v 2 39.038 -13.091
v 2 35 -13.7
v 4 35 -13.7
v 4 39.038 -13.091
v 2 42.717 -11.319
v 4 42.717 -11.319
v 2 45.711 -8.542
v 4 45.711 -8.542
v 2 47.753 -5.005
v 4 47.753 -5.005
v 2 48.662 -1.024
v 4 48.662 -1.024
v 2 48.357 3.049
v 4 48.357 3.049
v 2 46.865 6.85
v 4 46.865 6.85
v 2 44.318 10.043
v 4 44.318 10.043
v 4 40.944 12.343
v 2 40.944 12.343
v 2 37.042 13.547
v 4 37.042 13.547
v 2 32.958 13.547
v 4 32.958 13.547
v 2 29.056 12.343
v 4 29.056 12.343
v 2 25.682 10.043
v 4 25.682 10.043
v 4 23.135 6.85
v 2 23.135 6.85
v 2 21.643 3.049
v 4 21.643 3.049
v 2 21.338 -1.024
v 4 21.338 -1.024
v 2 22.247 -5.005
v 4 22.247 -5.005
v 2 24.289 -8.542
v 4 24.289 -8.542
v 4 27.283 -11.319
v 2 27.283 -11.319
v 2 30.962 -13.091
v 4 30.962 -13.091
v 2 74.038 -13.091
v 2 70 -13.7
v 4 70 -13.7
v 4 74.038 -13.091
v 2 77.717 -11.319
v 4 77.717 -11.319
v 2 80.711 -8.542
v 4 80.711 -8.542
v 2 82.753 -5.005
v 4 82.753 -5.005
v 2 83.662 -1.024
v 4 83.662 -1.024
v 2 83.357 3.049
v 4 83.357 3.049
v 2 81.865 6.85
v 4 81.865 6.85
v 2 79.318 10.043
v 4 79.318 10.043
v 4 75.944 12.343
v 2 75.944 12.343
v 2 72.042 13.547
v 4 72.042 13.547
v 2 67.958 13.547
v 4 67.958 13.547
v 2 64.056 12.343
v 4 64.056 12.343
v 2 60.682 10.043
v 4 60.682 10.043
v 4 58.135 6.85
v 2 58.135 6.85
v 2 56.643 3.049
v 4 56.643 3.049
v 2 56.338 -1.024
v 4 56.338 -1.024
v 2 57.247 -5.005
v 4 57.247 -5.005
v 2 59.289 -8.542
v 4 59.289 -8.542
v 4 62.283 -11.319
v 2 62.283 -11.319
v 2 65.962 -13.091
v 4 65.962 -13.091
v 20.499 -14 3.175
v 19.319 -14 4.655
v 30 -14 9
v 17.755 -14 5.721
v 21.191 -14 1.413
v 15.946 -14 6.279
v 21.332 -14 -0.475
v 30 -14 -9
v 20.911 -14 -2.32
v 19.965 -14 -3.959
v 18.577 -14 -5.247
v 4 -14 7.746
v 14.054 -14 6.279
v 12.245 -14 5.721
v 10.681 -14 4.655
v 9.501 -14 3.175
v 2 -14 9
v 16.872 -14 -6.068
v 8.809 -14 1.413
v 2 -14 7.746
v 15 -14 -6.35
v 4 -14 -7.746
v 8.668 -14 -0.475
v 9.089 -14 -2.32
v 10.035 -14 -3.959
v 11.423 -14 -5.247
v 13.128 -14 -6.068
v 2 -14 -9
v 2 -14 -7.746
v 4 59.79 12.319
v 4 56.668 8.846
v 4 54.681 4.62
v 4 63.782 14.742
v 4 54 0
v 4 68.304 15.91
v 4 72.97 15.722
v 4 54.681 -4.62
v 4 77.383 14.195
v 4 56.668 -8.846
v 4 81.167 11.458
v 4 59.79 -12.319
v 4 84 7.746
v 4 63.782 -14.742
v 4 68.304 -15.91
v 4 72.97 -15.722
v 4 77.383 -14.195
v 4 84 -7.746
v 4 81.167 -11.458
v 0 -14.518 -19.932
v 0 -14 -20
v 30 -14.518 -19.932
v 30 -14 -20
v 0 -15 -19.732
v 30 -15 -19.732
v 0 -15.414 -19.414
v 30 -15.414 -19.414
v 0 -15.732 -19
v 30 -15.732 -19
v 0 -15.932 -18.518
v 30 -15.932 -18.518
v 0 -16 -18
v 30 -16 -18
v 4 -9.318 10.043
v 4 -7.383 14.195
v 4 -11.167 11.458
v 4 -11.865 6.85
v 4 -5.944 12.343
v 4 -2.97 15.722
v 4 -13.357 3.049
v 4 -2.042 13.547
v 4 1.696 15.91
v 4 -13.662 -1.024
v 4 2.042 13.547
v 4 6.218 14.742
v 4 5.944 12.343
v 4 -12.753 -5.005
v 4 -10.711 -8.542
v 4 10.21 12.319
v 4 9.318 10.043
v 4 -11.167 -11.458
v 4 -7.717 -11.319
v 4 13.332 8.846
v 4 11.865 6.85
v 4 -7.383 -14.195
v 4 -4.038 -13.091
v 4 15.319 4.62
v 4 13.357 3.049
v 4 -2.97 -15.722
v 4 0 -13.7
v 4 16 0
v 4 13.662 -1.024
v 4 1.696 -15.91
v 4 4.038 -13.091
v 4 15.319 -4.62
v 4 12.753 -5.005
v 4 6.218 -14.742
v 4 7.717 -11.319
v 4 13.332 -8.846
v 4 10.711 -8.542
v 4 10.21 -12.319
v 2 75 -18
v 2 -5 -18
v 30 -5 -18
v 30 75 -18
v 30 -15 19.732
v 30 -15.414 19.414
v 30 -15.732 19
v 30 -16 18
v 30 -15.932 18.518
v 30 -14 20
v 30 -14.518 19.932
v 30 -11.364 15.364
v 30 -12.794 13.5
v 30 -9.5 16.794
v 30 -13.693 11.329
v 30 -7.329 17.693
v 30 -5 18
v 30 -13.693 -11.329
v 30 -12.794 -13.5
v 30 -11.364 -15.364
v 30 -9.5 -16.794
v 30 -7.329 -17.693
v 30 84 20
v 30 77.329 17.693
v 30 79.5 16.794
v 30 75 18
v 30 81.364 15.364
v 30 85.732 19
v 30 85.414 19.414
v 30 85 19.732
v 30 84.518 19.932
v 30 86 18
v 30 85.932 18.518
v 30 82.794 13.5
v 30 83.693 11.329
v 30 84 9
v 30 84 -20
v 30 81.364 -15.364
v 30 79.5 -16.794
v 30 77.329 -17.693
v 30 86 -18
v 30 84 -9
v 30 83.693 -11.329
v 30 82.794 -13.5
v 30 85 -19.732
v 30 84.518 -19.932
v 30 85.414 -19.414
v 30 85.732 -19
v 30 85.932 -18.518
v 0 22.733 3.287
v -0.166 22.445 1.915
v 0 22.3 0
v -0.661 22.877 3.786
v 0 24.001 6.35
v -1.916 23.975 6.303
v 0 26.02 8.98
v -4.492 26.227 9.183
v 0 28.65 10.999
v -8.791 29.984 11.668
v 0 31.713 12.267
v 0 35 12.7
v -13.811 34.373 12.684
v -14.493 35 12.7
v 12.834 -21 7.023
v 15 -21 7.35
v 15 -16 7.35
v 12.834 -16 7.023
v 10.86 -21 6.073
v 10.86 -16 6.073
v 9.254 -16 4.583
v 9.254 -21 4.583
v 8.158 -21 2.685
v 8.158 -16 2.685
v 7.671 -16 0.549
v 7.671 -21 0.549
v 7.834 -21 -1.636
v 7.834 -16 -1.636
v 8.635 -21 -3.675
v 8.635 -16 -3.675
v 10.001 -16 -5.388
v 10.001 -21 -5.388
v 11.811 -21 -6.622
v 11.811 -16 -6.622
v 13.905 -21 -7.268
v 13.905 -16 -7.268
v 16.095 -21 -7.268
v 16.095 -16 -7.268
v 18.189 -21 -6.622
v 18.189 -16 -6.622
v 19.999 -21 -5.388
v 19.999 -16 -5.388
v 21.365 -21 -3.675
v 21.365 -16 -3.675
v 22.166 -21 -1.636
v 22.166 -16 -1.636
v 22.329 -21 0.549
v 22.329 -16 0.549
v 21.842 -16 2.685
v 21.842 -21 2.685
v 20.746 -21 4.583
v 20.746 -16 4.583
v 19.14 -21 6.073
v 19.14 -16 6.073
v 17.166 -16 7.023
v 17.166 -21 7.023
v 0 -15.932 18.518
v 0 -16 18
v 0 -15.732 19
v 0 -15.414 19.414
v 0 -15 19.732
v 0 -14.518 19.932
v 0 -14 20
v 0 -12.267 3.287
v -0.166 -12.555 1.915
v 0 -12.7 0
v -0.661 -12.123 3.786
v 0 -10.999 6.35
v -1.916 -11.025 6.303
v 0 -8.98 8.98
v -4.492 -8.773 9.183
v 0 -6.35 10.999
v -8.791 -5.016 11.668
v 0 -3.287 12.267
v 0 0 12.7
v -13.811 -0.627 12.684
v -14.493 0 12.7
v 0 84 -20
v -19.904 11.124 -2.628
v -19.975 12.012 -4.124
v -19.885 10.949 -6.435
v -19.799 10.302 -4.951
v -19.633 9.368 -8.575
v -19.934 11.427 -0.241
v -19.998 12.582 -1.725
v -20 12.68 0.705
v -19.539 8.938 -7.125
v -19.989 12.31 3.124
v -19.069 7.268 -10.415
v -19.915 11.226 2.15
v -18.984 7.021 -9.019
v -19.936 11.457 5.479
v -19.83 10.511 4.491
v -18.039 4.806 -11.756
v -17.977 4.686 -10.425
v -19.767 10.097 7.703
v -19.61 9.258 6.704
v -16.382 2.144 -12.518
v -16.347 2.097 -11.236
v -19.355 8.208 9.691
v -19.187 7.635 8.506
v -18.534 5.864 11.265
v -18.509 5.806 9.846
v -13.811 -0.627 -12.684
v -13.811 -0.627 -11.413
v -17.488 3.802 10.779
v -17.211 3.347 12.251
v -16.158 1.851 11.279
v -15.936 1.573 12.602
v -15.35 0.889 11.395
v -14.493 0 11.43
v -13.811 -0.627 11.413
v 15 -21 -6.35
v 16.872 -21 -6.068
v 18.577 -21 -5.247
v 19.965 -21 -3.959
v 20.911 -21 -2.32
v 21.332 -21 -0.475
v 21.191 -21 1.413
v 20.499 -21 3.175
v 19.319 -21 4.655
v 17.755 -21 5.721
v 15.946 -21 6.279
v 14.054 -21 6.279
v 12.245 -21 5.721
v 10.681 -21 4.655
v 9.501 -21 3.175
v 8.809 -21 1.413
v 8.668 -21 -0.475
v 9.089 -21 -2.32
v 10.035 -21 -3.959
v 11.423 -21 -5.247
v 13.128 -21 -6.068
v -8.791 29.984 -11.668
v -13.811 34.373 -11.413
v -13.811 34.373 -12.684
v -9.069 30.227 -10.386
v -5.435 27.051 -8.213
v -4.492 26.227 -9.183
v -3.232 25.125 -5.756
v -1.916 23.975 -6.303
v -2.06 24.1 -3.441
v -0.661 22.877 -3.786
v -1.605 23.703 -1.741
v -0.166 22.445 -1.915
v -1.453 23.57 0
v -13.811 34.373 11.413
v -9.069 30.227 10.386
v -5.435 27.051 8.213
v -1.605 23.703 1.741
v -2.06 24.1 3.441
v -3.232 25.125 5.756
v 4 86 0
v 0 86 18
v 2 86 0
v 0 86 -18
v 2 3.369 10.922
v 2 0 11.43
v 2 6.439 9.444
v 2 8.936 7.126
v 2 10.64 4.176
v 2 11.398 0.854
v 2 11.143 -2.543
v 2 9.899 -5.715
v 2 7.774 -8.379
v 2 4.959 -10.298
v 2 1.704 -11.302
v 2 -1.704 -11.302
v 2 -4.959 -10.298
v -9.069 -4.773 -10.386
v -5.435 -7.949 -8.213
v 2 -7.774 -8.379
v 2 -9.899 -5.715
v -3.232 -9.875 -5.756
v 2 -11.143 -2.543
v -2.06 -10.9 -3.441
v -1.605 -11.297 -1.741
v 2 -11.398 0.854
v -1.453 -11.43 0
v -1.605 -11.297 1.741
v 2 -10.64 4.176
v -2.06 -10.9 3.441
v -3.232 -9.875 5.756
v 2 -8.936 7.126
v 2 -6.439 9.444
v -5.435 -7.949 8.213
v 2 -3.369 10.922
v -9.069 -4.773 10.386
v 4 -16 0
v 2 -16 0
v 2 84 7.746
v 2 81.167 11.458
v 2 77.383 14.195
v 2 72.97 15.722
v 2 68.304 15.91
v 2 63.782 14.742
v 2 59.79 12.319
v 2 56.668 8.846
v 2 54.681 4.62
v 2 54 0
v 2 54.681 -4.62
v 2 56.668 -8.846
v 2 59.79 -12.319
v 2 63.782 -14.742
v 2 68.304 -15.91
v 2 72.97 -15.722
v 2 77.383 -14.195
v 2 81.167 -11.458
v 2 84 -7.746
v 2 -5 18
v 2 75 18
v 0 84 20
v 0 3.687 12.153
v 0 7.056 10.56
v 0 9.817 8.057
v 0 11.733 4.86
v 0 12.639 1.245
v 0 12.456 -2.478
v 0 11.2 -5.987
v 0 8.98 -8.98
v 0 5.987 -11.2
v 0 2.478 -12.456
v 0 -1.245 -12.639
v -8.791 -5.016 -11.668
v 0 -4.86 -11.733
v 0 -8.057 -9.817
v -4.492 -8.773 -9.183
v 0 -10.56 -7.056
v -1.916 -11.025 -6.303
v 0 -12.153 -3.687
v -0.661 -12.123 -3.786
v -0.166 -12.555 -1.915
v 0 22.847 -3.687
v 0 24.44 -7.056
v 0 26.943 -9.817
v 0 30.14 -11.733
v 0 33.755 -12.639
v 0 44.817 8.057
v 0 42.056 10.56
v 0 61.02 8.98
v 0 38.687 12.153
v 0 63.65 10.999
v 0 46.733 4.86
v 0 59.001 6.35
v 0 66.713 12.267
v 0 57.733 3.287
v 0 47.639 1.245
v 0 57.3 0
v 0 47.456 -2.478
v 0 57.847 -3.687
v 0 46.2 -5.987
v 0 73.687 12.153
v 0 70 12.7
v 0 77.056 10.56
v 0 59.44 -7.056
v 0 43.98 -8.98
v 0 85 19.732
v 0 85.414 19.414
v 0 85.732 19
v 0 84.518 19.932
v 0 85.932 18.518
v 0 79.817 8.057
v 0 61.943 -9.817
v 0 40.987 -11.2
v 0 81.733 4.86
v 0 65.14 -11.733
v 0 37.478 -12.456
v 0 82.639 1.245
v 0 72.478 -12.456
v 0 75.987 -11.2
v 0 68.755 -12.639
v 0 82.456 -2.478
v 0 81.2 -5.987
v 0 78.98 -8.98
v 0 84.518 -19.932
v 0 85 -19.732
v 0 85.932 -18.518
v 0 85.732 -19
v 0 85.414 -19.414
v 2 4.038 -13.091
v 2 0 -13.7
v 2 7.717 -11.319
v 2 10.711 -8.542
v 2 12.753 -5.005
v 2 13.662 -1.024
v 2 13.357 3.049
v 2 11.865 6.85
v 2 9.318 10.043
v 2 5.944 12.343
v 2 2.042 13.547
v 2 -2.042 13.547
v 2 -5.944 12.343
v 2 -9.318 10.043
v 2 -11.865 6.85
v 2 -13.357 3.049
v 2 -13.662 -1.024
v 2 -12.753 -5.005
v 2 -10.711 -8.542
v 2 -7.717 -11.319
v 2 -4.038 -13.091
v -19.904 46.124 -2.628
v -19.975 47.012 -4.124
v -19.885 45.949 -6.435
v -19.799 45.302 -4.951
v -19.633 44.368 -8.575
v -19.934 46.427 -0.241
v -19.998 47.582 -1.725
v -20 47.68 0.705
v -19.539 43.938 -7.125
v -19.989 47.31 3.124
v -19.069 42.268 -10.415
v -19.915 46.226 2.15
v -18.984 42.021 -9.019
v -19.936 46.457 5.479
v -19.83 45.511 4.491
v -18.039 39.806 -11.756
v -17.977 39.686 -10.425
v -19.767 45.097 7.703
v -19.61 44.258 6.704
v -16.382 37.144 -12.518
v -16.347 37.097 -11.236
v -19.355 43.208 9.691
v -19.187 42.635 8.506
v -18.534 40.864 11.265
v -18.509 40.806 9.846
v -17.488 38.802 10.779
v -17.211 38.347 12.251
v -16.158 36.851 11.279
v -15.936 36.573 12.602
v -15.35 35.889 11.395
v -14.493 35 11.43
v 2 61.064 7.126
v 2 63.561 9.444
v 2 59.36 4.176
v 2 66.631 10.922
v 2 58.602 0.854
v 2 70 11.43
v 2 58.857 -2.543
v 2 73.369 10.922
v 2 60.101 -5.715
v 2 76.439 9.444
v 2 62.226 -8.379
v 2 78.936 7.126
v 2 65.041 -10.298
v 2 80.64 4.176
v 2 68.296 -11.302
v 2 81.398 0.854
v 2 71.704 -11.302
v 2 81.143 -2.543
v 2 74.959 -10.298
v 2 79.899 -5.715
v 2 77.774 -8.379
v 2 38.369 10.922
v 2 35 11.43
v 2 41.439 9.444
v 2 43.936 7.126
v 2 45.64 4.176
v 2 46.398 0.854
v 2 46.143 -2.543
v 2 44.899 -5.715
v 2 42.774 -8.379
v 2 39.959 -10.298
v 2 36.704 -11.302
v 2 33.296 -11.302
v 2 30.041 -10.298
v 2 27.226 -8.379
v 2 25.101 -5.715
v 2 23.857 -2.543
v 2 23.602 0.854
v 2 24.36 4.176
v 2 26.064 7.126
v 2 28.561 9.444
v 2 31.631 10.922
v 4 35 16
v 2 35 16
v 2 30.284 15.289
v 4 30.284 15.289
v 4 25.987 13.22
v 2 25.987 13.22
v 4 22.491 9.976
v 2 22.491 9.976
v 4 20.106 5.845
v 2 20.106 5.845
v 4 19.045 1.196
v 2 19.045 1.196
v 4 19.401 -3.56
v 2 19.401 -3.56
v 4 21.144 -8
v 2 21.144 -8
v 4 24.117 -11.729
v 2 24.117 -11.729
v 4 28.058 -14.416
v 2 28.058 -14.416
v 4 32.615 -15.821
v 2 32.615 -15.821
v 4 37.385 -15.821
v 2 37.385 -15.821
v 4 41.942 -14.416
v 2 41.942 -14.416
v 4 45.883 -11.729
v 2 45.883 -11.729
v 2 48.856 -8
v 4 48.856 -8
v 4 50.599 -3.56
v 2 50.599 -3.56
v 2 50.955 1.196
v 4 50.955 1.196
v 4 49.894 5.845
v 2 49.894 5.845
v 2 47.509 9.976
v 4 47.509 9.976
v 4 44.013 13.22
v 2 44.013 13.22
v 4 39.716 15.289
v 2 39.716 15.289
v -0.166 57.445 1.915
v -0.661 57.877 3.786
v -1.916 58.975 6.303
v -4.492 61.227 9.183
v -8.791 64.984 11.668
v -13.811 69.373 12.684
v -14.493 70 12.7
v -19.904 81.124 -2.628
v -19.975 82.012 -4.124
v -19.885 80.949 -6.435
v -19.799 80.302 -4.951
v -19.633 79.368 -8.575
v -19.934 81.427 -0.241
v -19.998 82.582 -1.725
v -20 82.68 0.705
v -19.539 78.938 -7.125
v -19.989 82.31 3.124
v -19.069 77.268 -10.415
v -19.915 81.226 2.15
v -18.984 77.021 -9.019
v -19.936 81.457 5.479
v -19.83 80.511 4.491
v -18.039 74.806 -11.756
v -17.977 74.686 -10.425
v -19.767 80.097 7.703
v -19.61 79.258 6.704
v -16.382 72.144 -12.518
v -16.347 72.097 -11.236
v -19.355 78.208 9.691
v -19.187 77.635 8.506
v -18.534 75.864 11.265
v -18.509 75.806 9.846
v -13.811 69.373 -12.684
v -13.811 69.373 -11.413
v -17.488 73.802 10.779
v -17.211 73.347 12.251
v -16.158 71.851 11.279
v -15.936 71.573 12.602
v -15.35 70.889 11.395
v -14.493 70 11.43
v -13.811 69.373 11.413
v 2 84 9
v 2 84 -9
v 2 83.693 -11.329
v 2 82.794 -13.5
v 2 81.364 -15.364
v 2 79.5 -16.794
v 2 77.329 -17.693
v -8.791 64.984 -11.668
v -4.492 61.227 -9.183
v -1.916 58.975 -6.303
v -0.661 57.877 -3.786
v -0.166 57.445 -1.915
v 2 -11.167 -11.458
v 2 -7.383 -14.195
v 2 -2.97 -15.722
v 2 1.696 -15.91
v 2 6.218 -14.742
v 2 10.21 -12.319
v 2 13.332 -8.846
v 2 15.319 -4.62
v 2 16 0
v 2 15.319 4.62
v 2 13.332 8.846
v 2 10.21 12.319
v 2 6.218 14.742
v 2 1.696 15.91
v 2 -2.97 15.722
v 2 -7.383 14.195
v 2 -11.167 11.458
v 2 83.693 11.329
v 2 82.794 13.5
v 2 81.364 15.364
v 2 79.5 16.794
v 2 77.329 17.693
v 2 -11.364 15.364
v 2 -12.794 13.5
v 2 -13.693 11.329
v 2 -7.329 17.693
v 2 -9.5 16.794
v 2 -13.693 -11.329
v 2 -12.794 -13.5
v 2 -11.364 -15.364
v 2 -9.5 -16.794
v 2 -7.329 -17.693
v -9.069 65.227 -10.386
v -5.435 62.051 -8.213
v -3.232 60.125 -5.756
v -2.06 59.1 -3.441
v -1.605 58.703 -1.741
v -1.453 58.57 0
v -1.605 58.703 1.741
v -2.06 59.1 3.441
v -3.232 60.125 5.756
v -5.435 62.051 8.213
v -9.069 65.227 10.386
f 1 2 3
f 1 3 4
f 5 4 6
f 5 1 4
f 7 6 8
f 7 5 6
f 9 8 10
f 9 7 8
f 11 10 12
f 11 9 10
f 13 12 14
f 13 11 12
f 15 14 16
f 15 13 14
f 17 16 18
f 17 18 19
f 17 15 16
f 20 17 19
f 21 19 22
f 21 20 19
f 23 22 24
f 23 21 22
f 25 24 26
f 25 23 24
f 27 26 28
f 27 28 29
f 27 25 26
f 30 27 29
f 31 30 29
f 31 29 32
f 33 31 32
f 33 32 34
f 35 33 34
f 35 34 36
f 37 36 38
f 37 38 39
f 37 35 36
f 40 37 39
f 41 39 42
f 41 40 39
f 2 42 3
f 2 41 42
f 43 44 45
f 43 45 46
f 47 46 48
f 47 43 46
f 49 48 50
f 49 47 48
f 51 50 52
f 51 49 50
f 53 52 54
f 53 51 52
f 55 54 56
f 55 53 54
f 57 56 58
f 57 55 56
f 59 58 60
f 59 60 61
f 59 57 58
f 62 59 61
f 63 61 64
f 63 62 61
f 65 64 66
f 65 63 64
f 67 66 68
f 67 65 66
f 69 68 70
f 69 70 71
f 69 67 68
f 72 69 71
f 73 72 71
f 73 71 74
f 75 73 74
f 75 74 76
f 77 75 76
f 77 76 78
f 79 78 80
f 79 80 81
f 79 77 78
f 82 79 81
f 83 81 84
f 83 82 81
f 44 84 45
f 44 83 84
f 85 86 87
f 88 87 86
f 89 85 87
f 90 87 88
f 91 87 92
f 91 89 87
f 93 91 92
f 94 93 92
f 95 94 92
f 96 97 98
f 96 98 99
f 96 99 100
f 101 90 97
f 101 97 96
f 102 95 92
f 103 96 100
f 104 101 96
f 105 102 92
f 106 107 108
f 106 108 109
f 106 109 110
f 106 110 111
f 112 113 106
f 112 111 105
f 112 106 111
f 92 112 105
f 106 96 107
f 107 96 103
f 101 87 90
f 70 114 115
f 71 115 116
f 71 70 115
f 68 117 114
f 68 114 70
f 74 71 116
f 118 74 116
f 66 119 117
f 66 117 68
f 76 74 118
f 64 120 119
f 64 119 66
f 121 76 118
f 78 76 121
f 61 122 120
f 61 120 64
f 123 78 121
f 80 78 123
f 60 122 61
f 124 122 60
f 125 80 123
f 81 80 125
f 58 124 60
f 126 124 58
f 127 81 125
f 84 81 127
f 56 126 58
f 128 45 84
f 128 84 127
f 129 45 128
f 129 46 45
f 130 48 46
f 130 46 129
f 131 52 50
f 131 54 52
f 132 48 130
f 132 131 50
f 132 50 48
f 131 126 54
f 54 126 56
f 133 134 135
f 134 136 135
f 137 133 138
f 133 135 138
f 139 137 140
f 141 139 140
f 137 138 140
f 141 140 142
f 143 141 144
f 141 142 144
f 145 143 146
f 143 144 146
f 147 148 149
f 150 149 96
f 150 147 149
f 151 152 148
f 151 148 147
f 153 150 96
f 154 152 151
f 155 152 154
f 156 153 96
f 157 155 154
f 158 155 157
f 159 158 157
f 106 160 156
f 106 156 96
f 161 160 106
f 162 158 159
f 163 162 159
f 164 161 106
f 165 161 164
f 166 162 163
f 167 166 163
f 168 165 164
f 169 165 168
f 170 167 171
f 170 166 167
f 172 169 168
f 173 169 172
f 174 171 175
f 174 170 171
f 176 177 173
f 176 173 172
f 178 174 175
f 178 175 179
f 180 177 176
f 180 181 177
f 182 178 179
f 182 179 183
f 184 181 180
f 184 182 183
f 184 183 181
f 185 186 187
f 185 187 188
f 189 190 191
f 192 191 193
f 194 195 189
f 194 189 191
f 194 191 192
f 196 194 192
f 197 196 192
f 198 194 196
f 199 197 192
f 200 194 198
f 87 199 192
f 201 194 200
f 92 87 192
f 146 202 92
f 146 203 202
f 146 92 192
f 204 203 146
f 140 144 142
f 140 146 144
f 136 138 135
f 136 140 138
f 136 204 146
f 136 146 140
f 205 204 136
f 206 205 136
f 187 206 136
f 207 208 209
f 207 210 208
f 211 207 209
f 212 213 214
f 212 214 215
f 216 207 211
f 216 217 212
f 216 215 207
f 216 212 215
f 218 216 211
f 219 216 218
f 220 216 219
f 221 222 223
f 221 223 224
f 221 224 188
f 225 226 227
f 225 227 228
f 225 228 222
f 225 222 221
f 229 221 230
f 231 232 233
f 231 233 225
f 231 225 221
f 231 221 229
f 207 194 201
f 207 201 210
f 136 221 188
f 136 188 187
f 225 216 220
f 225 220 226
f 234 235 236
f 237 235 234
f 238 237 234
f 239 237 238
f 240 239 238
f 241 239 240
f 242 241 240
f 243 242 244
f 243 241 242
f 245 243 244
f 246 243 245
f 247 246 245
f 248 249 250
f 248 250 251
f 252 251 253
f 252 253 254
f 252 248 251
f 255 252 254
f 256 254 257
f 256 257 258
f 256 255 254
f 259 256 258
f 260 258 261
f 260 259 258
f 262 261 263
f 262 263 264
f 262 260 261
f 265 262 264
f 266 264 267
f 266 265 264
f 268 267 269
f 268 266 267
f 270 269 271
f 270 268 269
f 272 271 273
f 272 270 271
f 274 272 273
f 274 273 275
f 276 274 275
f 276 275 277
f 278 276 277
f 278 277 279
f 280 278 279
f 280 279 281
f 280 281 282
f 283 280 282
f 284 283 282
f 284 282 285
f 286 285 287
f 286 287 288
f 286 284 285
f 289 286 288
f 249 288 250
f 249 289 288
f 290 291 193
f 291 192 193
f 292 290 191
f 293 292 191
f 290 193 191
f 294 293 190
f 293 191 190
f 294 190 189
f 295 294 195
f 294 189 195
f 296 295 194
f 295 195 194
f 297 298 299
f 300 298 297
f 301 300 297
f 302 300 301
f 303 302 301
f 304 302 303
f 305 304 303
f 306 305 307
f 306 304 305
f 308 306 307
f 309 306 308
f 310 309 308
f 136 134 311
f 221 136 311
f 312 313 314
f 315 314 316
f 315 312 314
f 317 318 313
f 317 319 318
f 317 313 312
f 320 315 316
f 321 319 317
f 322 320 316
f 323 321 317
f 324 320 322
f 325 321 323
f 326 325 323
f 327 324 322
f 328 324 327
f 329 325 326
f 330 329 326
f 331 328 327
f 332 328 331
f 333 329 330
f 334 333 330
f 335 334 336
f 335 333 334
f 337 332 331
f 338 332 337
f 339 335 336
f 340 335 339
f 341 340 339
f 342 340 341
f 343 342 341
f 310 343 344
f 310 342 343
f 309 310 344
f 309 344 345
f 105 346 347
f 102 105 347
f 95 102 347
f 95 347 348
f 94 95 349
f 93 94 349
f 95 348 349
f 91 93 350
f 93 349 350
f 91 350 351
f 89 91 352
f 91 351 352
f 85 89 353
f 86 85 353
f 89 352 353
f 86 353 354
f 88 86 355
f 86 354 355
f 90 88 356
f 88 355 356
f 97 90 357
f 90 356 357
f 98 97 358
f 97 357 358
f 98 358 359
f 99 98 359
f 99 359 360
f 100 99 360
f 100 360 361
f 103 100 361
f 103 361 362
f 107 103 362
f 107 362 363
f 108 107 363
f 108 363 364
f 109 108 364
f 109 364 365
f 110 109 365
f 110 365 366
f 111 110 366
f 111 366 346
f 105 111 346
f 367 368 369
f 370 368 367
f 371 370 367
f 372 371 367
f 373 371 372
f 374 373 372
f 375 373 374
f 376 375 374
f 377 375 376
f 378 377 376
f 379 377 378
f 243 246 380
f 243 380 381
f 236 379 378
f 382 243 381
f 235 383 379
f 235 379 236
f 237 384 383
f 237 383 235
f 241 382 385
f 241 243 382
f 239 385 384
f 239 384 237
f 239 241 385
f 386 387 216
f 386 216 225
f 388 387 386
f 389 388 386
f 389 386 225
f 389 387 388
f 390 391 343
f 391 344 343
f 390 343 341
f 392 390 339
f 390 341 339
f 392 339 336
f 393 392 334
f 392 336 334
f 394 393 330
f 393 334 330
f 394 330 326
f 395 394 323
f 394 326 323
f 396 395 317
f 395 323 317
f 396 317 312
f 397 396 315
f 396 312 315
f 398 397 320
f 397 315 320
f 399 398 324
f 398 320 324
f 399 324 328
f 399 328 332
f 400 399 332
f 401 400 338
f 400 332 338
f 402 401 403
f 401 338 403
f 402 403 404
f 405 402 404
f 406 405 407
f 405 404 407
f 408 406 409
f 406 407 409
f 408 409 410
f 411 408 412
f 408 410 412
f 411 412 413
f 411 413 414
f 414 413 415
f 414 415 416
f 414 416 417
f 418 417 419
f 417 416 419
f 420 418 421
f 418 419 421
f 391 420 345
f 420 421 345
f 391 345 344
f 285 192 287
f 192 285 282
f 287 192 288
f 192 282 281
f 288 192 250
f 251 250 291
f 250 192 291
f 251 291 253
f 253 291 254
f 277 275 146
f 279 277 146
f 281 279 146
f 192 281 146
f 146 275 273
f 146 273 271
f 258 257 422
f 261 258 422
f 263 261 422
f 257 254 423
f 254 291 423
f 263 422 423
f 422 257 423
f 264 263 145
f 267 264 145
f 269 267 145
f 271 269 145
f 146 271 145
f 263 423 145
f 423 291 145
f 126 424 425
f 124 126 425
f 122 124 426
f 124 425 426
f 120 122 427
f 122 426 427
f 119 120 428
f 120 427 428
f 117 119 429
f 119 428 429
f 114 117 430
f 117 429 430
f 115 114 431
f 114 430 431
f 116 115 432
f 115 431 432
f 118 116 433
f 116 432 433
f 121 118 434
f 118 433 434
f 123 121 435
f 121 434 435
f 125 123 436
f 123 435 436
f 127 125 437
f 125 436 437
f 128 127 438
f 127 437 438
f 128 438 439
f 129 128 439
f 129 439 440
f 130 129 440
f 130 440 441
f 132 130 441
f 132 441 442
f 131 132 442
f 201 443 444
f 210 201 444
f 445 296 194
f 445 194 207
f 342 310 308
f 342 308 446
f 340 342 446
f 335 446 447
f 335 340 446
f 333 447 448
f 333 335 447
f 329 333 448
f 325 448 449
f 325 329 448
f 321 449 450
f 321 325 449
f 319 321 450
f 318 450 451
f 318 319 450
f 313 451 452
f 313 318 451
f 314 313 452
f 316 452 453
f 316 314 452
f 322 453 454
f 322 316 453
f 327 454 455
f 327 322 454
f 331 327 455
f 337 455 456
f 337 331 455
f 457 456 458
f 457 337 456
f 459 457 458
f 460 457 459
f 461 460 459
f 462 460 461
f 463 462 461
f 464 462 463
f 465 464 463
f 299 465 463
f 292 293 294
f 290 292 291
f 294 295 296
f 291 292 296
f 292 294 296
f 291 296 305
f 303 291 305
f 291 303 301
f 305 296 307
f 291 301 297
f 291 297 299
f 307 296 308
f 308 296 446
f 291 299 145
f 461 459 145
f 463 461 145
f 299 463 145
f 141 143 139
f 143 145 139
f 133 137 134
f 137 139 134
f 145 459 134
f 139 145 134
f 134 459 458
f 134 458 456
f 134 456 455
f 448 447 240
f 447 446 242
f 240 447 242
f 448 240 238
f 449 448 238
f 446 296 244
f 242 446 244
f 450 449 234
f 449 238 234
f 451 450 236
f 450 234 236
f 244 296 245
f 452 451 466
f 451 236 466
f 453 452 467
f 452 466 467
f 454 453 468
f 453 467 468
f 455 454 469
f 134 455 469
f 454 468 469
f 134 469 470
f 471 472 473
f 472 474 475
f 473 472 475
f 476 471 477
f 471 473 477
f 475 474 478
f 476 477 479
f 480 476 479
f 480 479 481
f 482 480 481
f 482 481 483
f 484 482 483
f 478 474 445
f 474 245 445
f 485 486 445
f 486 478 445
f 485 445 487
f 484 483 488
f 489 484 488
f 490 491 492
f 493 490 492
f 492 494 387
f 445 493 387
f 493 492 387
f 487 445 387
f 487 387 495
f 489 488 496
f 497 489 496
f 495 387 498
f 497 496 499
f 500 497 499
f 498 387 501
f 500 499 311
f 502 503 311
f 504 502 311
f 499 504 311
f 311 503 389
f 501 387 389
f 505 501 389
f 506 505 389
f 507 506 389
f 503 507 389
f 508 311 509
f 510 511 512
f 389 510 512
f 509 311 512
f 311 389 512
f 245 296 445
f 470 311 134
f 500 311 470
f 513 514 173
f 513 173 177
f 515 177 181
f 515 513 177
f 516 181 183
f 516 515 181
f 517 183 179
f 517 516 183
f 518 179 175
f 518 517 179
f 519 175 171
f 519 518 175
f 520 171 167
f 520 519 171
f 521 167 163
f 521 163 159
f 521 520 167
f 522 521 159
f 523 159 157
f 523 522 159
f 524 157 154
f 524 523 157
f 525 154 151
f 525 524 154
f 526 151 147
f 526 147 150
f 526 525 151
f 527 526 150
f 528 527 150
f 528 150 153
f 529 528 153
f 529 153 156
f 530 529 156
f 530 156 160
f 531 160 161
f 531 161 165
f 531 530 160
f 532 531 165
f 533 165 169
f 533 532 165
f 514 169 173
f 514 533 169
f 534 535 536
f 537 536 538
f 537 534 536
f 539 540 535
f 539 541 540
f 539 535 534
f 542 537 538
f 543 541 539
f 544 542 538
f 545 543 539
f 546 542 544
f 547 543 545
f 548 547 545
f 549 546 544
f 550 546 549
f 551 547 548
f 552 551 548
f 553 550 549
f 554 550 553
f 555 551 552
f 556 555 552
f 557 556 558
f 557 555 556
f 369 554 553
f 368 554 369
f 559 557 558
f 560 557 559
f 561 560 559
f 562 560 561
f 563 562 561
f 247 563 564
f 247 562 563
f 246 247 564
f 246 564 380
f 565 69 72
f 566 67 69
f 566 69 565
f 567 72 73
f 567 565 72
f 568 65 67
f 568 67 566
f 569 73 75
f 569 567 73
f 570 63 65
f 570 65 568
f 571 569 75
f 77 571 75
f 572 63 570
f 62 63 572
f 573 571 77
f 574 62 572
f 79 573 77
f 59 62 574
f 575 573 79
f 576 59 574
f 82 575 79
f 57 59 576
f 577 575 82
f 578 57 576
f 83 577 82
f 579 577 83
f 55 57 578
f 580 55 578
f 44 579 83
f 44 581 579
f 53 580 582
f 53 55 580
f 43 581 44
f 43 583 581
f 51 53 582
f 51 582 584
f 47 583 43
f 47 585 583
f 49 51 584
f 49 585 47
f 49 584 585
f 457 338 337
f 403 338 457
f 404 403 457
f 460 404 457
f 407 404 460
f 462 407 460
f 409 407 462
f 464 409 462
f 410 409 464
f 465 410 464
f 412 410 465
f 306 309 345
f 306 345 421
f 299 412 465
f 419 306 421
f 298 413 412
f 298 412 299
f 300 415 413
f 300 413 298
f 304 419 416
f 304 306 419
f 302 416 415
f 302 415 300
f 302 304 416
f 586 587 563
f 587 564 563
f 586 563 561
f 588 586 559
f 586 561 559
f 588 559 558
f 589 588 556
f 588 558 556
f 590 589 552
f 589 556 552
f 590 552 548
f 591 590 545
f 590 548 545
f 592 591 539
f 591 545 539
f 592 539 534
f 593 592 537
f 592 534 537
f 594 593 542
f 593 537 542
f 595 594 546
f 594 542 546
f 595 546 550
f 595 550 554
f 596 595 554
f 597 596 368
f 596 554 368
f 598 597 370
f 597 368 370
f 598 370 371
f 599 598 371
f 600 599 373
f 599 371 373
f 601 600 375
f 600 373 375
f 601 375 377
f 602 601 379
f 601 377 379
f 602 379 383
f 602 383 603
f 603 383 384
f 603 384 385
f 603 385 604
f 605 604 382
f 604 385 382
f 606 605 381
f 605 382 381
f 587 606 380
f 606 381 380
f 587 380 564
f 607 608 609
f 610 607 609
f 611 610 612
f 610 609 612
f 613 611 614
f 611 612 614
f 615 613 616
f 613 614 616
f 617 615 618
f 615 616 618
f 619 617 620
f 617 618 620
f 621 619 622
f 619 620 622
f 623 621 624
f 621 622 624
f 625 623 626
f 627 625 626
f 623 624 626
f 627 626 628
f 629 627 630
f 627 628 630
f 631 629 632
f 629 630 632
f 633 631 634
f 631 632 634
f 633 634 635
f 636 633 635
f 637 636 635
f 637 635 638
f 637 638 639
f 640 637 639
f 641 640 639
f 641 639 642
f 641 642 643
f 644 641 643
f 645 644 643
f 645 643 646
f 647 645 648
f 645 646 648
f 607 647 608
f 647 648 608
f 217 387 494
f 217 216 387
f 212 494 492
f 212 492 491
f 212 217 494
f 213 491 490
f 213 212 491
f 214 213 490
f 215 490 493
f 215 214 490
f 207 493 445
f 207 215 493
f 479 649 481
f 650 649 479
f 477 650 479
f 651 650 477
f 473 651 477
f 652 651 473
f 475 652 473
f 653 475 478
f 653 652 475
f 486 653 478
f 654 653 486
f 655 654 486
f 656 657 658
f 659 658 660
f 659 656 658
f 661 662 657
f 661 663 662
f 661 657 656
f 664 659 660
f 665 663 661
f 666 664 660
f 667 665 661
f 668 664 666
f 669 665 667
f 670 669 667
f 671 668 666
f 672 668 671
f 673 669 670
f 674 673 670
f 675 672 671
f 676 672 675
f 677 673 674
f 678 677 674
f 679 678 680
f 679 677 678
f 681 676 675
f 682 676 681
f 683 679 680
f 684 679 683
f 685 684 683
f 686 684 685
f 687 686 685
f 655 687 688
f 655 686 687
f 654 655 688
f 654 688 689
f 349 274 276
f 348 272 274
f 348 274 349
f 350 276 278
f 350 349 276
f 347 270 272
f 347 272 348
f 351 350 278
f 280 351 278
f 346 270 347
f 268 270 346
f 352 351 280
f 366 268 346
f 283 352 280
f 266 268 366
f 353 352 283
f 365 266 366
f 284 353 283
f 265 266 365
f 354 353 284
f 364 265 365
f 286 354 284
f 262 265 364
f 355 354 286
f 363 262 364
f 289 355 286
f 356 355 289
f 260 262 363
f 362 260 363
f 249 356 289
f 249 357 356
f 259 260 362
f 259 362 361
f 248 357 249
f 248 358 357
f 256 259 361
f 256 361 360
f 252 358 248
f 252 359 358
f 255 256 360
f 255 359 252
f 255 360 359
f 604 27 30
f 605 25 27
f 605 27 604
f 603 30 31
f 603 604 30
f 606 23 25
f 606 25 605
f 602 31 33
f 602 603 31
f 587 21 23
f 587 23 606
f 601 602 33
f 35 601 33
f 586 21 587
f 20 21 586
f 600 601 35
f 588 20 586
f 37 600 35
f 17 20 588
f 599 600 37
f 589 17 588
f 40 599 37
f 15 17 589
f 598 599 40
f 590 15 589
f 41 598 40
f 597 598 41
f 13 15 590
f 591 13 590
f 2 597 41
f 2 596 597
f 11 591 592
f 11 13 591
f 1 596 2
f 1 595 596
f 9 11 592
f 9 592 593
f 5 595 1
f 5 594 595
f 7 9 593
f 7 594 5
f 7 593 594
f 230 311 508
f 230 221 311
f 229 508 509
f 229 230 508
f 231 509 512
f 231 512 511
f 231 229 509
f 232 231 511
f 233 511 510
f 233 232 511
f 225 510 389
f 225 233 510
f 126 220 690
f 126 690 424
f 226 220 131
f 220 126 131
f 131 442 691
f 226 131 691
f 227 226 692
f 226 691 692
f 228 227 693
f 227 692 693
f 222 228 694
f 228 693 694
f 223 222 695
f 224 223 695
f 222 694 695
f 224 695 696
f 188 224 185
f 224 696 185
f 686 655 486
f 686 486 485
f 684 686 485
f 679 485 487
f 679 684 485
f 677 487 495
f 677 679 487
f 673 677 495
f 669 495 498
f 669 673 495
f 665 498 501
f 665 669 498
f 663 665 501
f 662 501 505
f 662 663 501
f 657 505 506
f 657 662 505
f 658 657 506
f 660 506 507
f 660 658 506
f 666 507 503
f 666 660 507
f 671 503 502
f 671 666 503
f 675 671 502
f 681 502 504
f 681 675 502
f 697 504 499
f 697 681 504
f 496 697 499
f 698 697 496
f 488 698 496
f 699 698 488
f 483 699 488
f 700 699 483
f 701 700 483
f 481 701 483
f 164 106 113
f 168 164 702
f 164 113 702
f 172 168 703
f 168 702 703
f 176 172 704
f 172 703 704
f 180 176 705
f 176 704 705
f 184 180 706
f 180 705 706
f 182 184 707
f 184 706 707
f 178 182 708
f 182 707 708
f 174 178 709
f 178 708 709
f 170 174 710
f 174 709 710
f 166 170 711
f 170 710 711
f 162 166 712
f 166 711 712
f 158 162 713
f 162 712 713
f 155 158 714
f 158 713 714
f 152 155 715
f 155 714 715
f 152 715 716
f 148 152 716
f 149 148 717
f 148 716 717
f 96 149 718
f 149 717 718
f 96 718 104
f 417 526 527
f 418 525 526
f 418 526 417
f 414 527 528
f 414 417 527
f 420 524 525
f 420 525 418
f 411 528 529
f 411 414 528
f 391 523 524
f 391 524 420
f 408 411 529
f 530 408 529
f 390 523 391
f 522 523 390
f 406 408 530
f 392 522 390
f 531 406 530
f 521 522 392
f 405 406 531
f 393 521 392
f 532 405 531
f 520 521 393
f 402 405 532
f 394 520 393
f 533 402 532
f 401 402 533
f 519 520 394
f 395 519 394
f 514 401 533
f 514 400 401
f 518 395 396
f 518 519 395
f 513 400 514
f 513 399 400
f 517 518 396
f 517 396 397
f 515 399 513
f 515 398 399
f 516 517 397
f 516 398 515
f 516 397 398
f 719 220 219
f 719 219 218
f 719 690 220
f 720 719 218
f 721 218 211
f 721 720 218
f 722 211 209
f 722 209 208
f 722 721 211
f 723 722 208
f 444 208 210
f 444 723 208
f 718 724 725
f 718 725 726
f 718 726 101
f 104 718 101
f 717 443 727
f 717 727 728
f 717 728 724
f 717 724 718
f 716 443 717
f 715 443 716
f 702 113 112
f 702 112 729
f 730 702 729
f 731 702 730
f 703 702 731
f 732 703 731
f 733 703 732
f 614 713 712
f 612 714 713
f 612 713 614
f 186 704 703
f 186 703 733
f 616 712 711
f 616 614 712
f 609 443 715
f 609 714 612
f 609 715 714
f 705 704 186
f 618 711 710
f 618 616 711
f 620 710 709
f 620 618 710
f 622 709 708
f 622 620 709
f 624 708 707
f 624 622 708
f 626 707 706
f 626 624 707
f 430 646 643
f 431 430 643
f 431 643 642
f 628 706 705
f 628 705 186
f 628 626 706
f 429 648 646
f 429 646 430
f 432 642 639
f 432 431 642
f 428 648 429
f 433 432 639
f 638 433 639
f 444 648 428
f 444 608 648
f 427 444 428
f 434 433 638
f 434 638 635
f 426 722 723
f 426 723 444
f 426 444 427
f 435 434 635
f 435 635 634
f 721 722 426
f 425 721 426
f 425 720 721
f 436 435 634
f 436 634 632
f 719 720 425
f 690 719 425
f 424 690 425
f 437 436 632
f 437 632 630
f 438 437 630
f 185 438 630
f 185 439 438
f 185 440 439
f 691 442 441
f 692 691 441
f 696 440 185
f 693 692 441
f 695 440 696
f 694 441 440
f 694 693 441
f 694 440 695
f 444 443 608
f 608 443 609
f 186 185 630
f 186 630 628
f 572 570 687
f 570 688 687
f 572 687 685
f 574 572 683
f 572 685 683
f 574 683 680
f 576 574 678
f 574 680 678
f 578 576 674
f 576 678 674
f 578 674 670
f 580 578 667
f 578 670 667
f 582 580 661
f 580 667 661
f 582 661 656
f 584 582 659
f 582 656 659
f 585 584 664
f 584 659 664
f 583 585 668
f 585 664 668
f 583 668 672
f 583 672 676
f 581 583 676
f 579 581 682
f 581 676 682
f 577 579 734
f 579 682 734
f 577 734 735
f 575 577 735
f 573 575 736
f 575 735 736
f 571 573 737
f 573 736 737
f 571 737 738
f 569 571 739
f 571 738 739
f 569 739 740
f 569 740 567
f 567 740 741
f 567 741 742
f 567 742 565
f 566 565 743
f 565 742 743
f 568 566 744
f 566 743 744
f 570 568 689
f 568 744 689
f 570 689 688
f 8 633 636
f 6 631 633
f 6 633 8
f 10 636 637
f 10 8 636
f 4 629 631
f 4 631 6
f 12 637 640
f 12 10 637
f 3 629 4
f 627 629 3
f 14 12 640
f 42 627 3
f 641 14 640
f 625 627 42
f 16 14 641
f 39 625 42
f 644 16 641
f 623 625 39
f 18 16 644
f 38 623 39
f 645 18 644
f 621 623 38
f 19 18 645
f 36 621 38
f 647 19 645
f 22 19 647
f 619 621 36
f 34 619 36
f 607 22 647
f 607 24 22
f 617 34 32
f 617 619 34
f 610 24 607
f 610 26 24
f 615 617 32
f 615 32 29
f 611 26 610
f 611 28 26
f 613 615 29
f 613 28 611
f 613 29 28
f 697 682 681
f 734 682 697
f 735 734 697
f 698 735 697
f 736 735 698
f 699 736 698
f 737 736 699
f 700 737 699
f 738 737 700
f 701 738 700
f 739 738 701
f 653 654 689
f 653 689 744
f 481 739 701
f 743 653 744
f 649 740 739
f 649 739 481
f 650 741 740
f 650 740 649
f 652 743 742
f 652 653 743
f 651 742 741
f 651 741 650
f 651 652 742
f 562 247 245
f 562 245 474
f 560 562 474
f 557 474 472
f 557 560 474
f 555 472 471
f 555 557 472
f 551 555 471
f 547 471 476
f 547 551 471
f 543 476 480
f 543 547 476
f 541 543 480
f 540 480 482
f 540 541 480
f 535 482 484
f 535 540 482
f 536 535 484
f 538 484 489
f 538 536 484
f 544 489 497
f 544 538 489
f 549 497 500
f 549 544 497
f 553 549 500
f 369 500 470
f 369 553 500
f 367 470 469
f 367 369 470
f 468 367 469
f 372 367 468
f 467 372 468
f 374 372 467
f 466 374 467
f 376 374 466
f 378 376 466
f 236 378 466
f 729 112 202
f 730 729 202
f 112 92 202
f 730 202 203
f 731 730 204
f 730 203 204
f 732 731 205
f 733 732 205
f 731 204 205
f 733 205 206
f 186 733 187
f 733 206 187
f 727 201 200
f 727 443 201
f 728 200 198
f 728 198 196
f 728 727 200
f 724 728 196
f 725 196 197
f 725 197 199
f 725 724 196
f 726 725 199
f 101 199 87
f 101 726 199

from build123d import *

# Parameters (mm, degrees)
SKETCH1_W                      = 40
SKETCH1_H                      = 102
BOSS_EXTRUDE1_DEPTH            = 30
SHELL1_T                       = -2
CUT_EXTRUDE1_REACH             = 95.252
SKETCH2_R                      = 11.43
BOSS_EXTRUDE2_START            = 20
SKETCH3_R                      = 12.7
SKETCH3_R_2                    = 11.43
BOSS_EXTRUDE2_DEPTH            = 20
CUT_EXTRUDE2_REACH             = 95.252
CUT_EXTRUDE2_DIRECTION_2_REACH = 95.252
LPATTERN1_COUNT                = 3
LPATTERN1_PITCH                = 35
SKETCH5_R                      = 16
SKETCH5_R_2                    = 13.7
BOSS_EXTRUDE3_DEPTH            = 2
FILLET1_R                      = 2
CUT_EXTRUDE3_REACH             = 110.185
SKETCH6_R                      = 6.35
BOSS_EXTRUDE4_START            = 5
SKETCH7_R                      = 7.35
SKETCH7_R_2                    = 6.35
BOSS_EXTRUDE4_DEPTH            = 5
FILLET6_R                      = 9


with BuildPart() as part:
    # Sketch1 → Boss-Extrude1 (new body)
    with BuildSketch(Plane(origin=(0, 0, 0), x_dir=(0, 0, -1), z_dir=(1, 0, 0))):
        with Locations((0, 35)):
            Rectangle(SKETCH1_W, SKETCH1_H)
    extrude(amount=BOSS_EXTRUDE1_DEPTH)

    # Shell1
    shell1_openings = [part.faces().sort_by_distance(p)[0] for p in [
        (30, 35, 0),
    ]]
    offset(amount=SHELL1_T, openings=shell1_openings, kind=Kind.INTERSECTION)

    # Sketch2 → Cut-Extrude1 (cut, up to next)
    with BuildSketch(Plane.ZY, mode=Mode.PRIVATE) as cut_extrude1_sk1:
        Circle(SKETCH2_R)
    cut_extrude1_tool1 = extrude(cut_extrude1_sk1.sketch, amount=-CUT_EXTRUDE1_REACH, mode=Mode.PRIVATE) & part.part
    # Sketch2 → Cut-Extrude1 (cut, up to next)
    with BuildSketch(Plane.ZY, mode=Mode.PRIVATE) as cut_extrude1_sk2:
        with Locations((0, 35)):
            Circle(SKETCH2_R)
    cut_extrude1_tool2 = extrude(cut_extrude1_sk2.sketch, amount=-CUT_EXTRUDE1_REACH, mode=Mode.PRIVATE) & part.part
    # Sketch2 → Cut-Extrude1 (cut, up to next)
    with BuildSketch(Plane.ZY, mode=Mode.PRIVATE) as cut_extrude1_sk3:
        with Locations((0, 70)):
            Circle(SKETCH2_R)
    cut_extrude1_tool3 = extrude(cut_extrude1_sk3.sketch, amount=-CUT_EXTRUDE1_REACH, mode=Mode.PRIVATE) & part.part
    add(cut_extrude1_tool1.solids().sort_by_distance((0, 0, 0))[0], mode=Mode.SUBTRACT)
    add(cut_extrude1_tool2.solids().sort_by_distance((0, 35, 0))[0], mode=Mode.SUBTRACT)
    add(cut_extrude1_tool3.solids().sort_by_distance((0, 70, 0))[0], mode=Mode.SUBTRACT)

    # Sketch3 → Boss-Extrude2 (add)
    # profile 1 of 3: a face of its own
    with BuildSketch(Plane.ZY.offset(BOSS_EXTRUDE2_START)):
        Circle(SKETCH3_R)
        Circle(SKETCH3_R_2, mode=Mode.SUBTRACT)
    # profile 2 of 3: a face of its own
    with BuildSketch(Plane.ZY.offset(BOSS_EXTRUDE2_START)):
        with Locations((0, 35)):
            Circle(SKETCH3_R)
        with Locations((0, 35)):
            Circle(SKETCH3_R_2, mode=Mode.SUBTRACT)
    # profile 3 of 3: a face of its own
    with BuildSketch(Plane.ZY.offset(BOSS_EXTRUDE2_START)):
        with Locations((0, 70)):
            Circle(SKETCH3_R)
        with Locations((0, 70)):
            Circle(SKETCH3_R_2, mode=Mode.SUBTRACT)
    extrude(amount=-BOSS_EXTRUDE2_DEPTH)

    # Sketch4 → Cut-Extrude2 (cut, up to next)
    with BuildSketch(Plane.XY, mode=Mode.PRIVATE) as cut_extrude2_sk1:
        with BuildLine():
            ThreePointArc((-20, 82.7), (-18.317957439, 75.380446755), (-13.811148901, 69.372634868))
            Line((-13.811148901, 69.372634868), (0, 57.3))
            Line((0, 57.3), (-20, 57.3))
            Line((-20, 57.3), (-20, 82.7))
        make_face()
    cut_extrude2_tool1 = extrude(cut_extrude2_sk1.sketch, amount=-CUT_EXTRUDE2_REACH, mode=Mode.PRIVATE) & part.part
    cut_extrude2 = cut_extrude2_tool1.solids().sort_by_distance((-13.600187, 63.733143, 0))[0]
    add(cut_extrude2, mode=Mode.SUBTRACT)

    # Sketch4 → Cut-Extrude2 direction 2 (cut, up to next)
    with BuildSketch(Plane.XY, mode=Mode.PRIVATE) as cut_extrude2_direction_2_sk1:
        with BuildLine():
            ThreePointArc((-20, 82.7), (-18.317957439, 75.380446755), (-13.811148901, 69.372634868))
            Line((-13.811148901, 69.372634868), (0, 57.3))
            Line((0, 57.3), (-20, 57.3))
            Line((-20, 57.3), (-20, 82.7))
        make_face()
    cut_extrude2_direction_2_tool1 = extrude(cut_extrude2_direction_2_sk1.sketch, amount=CUT_EXTRUDE2_DIRECTION_2_REACH, mode=Mode.PRIVATE) & part.part
    cut_extrude2_direction_2 = cut_extrude2_direction_2_tool1.solids().sort_by_distance((-13.600187, 63.733143, 0))[0]
    add(cut_extrude2_direction_2, mode=Mode.SUBTRACT)

    # LPattern1: Cut-Extrude2, Cut-Extrude2 direction 2 ×3
    with Locations(*[(0, -i * LPATTERN1_PITCH, 0) for i in range(1, LPATTERN1_COUNT)]):
        add(cut_extrude2, mode=Mode.SUBTRACT)
        add(cut_extrude2_direction_2, mode=Mode.SUBTRACT)

    # Sketch5 → Boss-Extrude3 (add)
    # profile 1 of 3: a face of its own
    with BuildSketch(Plane(origin=(2, 0, 0), x_dir=(0, 0, -1), z_dir=(1, 0, 0))):
        with Locations((0, 70)):
            Circle(SKETCH5_R)
        with Locations((0, 70)):
            Circle(SKETCH5_R_2, mode=Mode.SUBTRACT)
    # profile 2 of 3: a face of its own
    with BuildSketch(Plane(origin=(2, 0, 0), x_dir=(0, 0, -1), z_dir=(1, 0, 0))):
        with Locations(Location((0, 35, 0), (0, 0, 180))):
            Circle(SKETCH5_R)
        with Locations((0, 35)):
            Circle(SKETCH5_R_2, mode=Mode.SUBTRACT)
    # profile 3 of 3: a face of its own
    with BuildSketch(Plane(origin=(2, 0, 0), x_dir=(0, 0, -1), z_dir=(1, 0, 0))):
        Circle(SKETCH5_R)
        Circle(SKETCH5_R_2, mode=Mode.SUBTRACT)
    extrude(amount=BOSS_EXTRUDE3_DEPTH)

    # Fillet1
    fillet1_edges = [part.edges().sort_by_distance(p)[0] for p in [
        (15, 86, 20),
        (15, -16, 20),
        (15, -16, -20),
        (15, 86, -20),
    ]]
    fillet(fillet1_edges, radius=FILLET1_R)

    # Sketch6 → Cut-Extrude3 (cut, up to next)
    with BuildSketch(Plane.XZ.offset(16), mode=Mode.PRIVATE) as cut_extrude3_sk1:
        with Locations(Location((15, 0, 0), (0, 0, 270))):
            Circle(SKETCH6_R)
    cut_extrude3_tool1 = extrude(cut_extrude3_sk1.sketch, amount=-CUT_EXTRUDE3_REACH, mode=Mode.PRIVATE) & part.part
    add(cut_extrude3_tool1.solids().sort_by_distance((15, -16, 0))[0], mode=Mode.SUBTRACT)

    # Sketch7 → Boss-Extrude4 (add)
    with BuildSketch(Plane.XZ.offset(16).offset(BOSS_EXTRUDE4_START)):
        with Locations(Location((15, 0, 0), (0, 0, 90))):
            Circle(SKETCH7_R)
        with Locations(Location((15, 0, 0), (0, 0, 270))):
            Circle(SKETCH7_R_2, mode=Mode.SUBTRACT)
    extrude(amount=-BOSS_EXTRUDE4_DEPTH)

    # Fillet6
    fillet6_edges = [part.edges().sort_by_distance(p)[0] for p in [
        (16, 84, -18),
        (16, 84, 18),
        (16, -14, 18),
        (16, -14, -18),
    ]]
    fillet(fillet6_edges, radius=FILLET6_R)


solid = part.part
